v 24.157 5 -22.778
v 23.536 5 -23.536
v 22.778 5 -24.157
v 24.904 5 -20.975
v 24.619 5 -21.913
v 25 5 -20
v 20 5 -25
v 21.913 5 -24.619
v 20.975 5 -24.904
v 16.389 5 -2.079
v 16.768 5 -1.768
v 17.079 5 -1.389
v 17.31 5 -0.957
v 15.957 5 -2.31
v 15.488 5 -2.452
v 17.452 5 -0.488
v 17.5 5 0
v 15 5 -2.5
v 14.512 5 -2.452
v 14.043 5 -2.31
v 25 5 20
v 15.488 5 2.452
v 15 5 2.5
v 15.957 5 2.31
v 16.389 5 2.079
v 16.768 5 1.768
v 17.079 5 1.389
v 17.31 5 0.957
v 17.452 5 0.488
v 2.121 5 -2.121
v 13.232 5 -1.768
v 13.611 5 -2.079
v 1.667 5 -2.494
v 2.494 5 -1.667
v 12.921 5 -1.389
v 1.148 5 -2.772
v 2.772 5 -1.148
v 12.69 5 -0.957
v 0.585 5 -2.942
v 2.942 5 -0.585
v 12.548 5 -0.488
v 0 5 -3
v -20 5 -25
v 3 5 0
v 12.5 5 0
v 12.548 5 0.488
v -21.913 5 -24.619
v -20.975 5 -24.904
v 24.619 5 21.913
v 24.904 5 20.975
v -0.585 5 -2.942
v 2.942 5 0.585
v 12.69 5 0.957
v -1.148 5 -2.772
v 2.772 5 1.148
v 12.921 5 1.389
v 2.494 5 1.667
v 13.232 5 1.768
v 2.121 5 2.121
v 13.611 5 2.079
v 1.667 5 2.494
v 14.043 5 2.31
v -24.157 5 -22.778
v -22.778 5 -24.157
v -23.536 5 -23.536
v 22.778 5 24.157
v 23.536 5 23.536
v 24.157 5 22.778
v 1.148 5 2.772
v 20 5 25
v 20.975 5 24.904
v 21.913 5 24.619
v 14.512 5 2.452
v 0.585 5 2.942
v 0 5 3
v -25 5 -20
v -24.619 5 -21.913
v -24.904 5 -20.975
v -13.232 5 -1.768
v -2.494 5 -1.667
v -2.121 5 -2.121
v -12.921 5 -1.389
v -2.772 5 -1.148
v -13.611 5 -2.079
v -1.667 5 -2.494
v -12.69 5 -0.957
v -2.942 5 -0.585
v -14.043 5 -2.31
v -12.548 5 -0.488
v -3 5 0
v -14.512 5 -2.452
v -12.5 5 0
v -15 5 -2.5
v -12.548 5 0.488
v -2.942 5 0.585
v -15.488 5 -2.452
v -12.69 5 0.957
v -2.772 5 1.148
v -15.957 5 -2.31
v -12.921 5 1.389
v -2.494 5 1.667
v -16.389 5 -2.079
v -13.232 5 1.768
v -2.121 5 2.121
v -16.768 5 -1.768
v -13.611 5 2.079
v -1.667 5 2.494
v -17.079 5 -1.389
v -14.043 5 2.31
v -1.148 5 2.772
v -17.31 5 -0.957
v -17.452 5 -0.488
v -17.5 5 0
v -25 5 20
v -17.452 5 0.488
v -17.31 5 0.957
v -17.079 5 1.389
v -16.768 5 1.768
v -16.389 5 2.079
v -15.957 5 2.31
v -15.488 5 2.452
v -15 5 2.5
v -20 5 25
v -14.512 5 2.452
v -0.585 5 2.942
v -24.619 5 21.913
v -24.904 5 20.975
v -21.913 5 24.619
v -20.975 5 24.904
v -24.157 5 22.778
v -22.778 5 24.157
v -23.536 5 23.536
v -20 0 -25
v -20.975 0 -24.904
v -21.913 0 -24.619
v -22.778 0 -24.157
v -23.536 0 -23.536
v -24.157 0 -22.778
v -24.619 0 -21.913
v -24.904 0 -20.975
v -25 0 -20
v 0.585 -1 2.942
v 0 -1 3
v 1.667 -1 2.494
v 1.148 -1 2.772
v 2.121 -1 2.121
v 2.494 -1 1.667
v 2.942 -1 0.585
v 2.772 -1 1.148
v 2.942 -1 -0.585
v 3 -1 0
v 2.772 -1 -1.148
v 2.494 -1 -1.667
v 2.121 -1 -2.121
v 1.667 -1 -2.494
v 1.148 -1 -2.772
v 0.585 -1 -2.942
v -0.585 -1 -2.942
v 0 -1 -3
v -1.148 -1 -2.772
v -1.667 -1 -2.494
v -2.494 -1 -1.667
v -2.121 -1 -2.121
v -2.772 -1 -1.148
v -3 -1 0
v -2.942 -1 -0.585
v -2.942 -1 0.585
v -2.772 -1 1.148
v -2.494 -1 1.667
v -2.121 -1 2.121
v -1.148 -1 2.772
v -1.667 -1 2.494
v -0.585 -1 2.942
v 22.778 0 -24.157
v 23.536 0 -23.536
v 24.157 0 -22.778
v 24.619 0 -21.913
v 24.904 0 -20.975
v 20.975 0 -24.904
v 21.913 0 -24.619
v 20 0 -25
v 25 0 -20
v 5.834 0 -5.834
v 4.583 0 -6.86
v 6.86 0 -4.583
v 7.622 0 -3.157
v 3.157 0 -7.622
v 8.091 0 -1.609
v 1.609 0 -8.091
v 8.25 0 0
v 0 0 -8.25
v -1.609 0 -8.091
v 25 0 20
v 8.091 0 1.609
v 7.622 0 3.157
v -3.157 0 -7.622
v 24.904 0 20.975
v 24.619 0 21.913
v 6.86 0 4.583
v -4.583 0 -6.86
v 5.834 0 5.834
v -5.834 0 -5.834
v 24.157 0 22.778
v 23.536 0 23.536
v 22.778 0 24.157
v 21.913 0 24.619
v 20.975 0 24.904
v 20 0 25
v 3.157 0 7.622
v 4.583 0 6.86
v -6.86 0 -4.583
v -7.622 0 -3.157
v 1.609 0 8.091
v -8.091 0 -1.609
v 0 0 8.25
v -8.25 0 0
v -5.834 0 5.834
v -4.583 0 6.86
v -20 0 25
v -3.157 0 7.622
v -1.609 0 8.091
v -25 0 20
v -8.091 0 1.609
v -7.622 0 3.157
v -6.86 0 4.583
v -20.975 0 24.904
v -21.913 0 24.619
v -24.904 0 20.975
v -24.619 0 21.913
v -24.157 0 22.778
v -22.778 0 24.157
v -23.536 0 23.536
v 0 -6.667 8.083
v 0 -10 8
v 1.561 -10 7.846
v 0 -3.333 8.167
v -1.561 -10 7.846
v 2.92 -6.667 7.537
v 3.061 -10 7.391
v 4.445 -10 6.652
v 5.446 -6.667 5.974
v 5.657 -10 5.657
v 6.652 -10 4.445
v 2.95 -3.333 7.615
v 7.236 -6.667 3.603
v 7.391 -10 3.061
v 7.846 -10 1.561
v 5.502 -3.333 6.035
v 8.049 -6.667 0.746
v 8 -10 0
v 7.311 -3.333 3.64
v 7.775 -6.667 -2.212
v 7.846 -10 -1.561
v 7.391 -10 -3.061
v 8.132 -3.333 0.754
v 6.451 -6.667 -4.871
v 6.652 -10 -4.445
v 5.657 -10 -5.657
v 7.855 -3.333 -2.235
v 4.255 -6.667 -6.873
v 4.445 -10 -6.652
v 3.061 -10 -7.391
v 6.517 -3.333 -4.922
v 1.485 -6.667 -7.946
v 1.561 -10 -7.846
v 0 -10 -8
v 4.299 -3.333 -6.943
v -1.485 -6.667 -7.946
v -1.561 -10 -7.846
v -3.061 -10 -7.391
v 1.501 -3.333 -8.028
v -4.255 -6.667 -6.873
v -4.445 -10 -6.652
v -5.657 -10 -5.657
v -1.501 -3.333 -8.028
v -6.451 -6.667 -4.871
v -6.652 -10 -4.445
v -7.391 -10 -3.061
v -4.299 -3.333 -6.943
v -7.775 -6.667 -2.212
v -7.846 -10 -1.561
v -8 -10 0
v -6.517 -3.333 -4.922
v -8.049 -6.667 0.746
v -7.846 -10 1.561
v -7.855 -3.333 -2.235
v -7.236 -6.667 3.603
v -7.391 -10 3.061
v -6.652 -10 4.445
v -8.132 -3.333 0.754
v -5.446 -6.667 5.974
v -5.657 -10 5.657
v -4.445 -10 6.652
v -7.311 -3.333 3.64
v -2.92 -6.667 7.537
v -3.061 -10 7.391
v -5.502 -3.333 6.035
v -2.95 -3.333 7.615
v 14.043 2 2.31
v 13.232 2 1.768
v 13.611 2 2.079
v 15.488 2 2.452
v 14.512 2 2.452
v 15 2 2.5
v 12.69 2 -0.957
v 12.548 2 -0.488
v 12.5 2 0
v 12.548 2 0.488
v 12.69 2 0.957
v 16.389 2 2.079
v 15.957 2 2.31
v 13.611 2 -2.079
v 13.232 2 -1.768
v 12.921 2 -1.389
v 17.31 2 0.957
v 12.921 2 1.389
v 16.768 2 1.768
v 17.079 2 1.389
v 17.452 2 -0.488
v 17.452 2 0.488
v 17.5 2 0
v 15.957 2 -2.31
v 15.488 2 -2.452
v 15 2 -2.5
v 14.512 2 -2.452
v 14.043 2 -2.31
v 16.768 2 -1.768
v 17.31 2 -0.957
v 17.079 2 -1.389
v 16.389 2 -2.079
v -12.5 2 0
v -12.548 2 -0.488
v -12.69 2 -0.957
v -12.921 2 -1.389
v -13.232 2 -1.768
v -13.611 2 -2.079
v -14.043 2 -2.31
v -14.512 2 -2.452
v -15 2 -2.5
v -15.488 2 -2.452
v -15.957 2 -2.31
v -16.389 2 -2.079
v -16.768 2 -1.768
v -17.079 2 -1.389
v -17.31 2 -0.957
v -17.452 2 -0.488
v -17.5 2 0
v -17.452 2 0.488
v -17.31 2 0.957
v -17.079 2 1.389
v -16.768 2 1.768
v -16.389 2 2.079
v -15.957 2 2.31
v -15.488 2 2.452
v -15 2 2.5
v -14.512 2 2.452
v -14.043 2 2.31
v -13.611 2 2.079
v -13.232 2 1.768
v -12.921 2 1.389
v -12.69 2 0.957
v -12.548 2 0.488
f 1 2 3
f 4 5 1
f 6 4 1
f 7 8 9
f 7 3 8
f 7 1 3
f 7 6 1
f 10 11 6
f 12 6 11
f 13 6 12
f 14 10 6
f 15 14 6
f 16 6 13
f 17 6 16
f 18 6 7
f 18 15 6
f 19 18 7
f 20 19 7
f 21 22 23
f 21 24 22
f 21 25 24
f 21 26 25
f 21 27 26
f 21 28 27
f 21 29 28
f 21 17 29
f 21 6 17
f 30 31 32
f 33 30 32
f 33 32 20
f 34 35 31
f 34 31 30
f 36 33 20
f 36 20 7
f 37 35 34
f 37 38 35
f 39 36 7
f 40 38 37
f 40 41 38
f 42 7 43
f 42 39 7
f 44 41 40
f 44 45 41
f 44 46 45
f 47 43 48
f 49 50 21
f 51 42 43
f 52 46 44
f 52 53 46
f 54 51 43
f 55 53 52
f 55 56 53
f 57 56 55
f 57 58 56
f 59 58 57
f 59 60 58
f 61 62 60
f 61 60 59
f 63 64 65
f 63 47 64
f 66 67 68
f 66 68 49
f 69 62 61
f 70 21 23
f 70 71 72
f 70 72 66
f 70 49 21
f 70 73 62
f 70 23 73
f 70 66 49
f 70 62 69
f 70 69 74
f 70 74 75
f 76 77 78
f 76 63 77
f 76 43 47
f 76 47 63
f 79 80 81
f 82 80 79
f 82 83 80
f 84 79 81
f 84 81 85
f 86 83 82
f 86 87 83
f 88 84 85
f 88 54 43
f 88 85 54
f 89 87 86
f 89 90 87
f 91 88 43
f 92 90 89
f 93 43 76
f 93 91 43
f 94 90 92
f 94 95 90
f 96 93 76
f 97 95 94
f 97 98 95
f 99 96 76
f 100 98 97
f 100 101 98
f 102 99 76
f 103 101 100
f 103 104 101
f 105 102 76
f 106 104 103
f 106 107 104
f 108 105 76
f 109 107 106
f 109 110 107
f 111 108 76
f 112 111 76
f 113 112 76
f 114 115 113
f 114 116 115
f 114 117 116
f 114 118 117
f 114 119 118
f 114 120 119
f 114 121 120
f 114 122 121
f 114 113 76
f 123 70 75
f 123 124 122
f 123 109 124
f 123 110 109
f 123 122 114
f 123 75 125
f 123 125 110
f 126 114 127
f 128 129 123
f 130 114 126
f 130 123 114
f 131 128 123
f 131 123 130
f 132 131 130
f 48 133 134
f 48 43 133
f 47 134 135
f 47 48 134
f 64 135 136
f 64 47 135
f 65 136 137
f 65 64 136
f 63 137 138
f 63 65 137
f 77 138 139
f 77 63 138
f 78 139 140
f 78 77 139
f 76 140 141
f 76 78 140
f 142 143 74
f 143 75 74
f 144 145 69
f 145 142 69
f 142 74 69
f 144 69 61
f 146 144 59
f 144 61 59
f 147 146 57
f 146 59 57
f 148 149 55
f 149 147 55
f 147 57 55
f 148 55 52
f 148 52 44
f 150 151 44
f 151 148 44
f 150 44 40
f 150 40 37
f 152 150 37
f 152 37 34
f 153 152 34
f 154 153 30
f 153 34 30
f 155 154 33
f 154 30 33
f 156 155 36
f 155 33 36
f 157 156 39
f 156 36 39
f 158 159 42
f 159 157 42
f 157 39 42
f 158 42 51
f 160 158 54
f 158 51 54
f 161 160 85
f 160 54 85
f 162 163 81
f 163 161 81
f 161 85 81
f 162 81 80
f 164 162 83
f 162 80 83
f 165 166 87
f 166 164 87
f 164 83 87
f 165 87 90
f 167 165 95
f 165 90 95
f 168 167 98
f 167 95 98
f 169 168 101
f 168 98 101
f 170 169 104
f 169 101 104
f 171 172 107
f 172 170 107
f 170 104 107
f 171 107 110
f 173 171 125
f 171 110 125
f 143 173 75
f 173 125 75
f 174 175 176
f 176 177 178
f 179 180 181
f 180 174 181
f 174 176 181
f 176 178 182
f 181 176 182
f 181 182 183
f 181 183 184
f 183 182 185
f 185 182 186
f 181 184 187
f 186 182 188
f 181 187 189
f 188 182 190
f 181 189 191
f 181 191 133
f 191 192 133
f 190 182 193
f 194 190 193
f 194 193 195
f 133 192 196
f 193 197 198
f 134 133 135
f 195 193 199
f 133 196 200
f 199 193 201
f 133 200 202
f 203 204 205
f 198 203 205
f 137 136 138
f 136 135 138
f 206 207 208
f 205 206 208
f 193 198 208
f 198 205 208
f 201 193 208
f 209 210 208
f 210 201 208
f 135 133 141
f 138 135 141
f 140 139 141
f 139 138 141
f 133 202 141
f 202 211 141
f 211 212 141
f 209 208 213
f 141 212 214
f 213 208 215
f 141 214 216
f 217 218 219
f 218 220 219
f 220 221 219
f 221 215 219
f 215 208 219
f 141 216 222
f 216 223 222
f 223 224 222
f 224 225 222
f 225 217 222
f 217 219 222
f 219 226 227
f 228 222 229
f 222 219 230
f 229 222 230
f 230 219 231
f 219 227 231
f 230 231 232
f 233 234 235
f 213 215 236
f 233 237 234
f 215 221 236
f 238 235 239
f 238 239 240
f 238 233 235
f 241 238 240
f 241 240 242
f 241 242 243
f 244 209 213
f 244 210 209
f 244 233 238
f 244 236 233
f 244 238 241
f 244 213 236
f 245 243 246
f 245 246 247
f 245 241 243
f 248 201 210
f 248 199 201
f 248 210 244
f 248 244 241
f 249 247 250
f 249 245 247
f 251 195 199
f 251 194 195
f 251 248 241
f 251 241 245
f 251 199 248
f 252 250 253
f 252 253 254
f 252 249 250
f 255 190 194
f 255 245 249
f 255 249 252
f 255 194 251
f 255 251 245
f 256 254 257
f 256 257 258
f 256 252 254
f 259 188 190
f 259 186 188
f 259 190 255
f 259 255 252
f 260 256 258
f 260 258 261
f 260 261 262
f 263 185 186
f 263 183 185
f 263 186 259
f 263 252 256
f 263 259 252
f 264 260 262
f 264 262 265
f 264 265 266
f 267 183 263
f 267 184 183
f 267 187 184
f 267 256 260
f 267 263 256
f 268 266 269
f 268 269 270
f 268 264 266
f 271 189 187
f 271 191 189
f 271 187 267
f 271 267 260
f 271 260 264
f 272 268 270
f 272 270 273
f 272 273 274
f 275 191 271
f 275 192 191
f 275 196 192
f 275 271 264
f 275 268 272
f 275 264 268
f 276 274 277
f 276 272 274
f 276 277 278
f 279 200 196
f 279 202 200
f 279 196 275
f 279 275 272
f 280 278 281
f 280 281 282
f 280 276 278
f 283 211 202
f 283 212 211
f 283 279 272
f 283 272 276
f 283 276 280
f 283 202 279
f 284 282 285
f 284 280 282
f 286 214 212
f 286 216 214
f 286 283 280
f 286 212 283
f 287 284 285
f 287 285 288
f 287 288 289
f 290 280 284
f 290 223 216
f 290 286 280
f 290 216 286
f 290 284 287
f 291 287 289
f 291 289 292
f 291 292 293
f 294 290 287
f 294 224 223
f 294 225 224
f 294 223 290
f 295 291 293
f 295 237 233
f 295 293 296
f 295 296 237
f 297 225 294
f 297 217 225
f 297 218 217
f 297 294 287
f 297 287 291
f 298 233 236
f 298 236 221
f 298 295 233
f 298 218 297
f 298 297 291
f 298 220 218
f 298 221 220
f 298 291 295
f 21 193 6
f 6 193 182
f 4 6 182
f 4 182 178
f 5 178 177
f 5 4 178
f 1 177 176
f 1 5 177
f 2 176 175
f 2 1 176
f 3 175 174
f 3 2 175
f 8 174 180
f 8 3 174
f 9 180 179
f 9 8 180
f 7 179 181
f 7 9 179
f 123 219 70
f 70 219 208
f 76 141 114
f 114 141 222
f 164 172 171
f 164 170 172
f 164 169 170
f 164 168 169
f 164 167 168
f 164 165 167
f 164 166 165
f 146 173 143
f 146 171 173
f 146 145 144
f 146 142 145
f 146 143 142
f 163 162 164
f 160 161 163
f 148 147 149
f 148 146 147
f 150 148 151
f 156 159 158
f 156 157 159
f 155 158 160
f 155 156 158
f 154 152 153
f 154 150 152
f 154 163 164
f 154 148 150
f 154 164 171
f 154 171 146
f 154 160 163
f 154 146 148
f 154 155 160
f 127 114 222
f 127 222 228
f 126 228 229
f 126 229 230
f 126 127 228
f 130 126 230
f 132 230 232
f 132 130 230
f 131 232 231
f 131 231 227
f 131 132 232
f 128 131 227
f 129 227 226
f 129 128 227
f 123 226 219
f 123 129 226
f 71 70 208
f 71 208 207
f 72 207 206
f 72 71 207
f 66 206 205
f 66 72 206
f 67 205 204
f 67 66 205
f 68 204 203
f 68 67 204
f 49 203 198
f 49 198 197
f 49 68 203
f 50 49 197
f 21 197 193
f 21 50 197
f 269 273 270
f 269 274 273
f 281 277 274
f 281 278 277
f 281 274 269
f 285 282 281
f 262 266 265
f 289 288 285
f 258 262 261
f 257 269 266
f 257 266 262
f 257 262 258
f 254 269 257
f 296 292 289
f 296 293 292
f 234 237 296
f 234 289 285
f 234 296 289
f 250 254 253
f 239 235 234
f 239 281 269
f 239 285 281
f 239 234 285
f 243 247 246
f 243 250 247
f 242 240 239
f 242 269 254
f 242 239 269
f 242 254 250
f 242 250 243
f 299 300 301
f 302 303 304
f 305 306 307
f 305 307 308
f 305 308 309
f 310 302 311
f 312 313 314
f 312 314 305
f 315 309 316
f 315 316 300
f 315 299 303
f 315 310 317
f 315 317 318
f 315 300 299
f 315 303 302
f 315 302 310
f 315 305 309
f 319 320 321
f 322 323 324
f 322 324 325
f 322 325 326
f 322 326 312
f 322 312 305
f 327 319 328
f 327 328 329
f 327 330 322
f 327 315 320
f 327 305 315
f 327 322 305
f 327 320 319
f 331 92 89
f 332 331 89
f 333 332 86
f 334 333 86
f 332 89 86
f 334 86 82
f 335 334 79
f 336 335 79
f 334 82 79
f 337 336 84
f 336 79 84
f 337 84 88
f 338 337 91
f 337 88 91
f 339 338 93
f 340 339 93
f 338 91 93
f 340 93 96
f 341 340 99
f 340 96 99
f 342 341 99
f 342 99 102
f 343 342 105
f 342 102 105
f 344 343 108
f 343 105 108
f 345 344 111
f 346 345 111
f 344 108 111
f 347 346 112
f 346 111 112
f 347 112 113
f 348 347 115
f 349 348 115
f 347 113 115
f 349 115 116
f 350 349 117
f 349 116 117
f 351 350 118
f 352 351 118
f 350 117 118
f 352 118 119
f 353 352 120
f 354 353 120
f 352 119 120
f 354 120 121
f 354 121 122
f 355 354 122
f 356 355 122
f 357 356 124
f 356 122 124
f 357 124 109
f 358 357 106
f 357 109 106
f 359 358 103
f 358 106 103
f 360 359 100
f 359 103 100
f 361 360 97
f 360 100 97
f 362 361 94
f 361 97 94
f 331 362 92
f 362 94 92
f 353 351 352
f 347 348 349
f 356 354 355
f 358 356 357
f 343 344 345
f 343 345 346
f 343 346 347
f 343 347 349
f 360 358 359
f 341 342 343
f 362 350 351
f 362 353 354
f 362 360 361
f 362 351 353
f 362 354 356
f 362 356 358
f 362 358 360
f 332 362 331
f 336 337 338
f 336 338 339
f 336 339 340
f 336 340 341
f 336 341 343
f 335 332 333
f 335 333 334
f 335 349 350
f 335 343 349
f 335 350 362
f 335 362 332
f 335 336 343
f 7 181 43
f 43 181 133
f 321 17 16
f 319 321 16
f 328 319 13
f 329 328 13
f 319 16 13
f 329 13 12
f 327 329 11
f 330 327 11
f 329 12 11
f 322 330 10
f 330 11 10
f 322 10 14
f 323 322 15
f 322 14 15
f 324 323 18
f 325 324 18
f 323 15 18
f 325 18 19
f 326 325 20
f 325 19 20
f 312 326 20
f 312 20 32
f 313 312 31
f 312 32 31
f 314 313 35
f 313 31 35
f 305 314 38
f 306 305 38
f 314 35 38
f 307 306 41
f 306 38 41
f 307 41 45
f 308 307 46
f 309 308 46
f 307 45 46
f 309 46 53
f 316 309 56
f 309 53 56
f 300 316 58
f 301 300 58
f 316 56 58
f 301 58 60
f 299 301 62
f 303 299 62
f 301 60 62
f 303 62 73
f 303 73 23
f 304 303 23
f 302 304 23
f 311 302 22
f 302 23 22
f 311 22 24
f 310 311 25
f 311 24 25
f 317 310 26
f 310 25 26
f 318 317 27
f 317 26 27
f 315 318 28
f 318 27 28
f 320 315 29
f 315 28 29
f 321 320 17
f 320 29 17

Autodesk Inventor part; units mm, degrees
ref_plane "YZ Plane" through (0, 0, 0) normal (1, 0, 0) x (0, 1, 0)
ref_plane "XZ Plane" through (0, 0, 0) normal (0, 1, 0) x (-1, 0, 0)
ref_plane "XY Plane" through (0, 0, 0) normal (0, 0, 1) x (1, 0, 0)
sketch "Sketch1" plane through (0, 0, 0) normal (0, 1, 0) x (-1, 0, 0)
  line L0 (25, 25) -> (-25, 25)
  line L1 (-25, 25) -> (-25, -25)
  line L2 (-25, -25) -> (25, -25)
  line L3 (25, -25) -> (25, 25)
  point P0 (0, 0)
  dimension "d0" = 50
  dimension "d1" = 50
  dimension "d2" = 25
  dimension "d3" = 25
extrude "Extrusion1" add sketch "Sketch1" along normal blind 5
sketch "Sketch2" plane through (0, 0, 0) normal (0, -1, 0) x (1, 0, 0)
  circle A0 centre (0, 0) radius 8
  dimension "d6" = 16
extrude "Extrusion2" add sketch "Sketch2" along normal blind 10
sketch "Sketch3" plane through (0, 5, 0) normal (0, 1, 0) x (1, 0, 0)
  line L0 (0, -3) -> (0, -3)
  line L1 (3, 0) -> (3, 0)
  line L2 (0, 3) -> (0, 3)
  line L3 (-3, 0) -> (-3, 0)
  arc A0 (-3, 0) -> (0, -3) centre (0, 0) ccw
  arc A1 (0, 3) -> (-3, 0) centre (0, 0) ccw
  arc A2 (3, 0) -> (0, 3) centre (0, 0) ccw
  arc A3 (0, -3) -> (3, 0) centre (0, 0) ccw
  point P0 (0, 0)
  dimension "d9" = 6
  dimension "d10" = 6
  dimension "d11" = 3
  dimension "d12" = 3
  dimension "d19" = 3
extrude "Extrusion3" cut sketch "Sketch3" against normal blind 6
sketch "Sketch4" plane through (0, 5, 0) normal (0, 1, 0) x (1, 0, 0)
  line L0 (-5, -5) -> (-5, 5) projected
  line L1 (-25, 25) -> (-25, -25) projected
  circle A0 centre (-15, 0) radius 2.5
  line L2 (5, -5) -> (-5, -5) projected
  line L3 (-5, 5) -> (5, 5) projected
  circle A1 centre (15, 0) radius 2.5
  line L4 (25, -25) -> (25, 25) projected
  point P0 (0, 0)
  dimension "d15" = 5
  dimension "d20" = 10
  dimension "d21" = 10
extrude "Extrusion4" cut sketch "Sketch4" against normal blind 3
fillet "Fillet1" radius 5 4 edges at (25, 2.5, 25) (25, 2.5, -25) (-25, 2.5, -25) (-25, 2.5, 25)
sketch "Sketch5" plane through (0, 0, 0) normal (1, 0, 0) x (0, 1, 0)
  line L0 (0, 8) -> (-10, 8) projected
  line L1 (0, 8) -> (0, 8.25)
  line L2 (0, 20) -> (0, -20) projected
  line L3 (-10, 8) -> (-10, -8) projected
  line L4 (0, 8.25) -> (-10, 8)
  line L5 (-10, 8) -> (0, 8)
  line L6 (-10, 0) -> (0, 0)
  dimension "d23" = 0.25
revolve "Revolution1" add sketch "Sketch5" angle 360 about axis through (0, -10, 0) along (0, 1, 0) contours L0 L4 L1
properties part number "Base2"
